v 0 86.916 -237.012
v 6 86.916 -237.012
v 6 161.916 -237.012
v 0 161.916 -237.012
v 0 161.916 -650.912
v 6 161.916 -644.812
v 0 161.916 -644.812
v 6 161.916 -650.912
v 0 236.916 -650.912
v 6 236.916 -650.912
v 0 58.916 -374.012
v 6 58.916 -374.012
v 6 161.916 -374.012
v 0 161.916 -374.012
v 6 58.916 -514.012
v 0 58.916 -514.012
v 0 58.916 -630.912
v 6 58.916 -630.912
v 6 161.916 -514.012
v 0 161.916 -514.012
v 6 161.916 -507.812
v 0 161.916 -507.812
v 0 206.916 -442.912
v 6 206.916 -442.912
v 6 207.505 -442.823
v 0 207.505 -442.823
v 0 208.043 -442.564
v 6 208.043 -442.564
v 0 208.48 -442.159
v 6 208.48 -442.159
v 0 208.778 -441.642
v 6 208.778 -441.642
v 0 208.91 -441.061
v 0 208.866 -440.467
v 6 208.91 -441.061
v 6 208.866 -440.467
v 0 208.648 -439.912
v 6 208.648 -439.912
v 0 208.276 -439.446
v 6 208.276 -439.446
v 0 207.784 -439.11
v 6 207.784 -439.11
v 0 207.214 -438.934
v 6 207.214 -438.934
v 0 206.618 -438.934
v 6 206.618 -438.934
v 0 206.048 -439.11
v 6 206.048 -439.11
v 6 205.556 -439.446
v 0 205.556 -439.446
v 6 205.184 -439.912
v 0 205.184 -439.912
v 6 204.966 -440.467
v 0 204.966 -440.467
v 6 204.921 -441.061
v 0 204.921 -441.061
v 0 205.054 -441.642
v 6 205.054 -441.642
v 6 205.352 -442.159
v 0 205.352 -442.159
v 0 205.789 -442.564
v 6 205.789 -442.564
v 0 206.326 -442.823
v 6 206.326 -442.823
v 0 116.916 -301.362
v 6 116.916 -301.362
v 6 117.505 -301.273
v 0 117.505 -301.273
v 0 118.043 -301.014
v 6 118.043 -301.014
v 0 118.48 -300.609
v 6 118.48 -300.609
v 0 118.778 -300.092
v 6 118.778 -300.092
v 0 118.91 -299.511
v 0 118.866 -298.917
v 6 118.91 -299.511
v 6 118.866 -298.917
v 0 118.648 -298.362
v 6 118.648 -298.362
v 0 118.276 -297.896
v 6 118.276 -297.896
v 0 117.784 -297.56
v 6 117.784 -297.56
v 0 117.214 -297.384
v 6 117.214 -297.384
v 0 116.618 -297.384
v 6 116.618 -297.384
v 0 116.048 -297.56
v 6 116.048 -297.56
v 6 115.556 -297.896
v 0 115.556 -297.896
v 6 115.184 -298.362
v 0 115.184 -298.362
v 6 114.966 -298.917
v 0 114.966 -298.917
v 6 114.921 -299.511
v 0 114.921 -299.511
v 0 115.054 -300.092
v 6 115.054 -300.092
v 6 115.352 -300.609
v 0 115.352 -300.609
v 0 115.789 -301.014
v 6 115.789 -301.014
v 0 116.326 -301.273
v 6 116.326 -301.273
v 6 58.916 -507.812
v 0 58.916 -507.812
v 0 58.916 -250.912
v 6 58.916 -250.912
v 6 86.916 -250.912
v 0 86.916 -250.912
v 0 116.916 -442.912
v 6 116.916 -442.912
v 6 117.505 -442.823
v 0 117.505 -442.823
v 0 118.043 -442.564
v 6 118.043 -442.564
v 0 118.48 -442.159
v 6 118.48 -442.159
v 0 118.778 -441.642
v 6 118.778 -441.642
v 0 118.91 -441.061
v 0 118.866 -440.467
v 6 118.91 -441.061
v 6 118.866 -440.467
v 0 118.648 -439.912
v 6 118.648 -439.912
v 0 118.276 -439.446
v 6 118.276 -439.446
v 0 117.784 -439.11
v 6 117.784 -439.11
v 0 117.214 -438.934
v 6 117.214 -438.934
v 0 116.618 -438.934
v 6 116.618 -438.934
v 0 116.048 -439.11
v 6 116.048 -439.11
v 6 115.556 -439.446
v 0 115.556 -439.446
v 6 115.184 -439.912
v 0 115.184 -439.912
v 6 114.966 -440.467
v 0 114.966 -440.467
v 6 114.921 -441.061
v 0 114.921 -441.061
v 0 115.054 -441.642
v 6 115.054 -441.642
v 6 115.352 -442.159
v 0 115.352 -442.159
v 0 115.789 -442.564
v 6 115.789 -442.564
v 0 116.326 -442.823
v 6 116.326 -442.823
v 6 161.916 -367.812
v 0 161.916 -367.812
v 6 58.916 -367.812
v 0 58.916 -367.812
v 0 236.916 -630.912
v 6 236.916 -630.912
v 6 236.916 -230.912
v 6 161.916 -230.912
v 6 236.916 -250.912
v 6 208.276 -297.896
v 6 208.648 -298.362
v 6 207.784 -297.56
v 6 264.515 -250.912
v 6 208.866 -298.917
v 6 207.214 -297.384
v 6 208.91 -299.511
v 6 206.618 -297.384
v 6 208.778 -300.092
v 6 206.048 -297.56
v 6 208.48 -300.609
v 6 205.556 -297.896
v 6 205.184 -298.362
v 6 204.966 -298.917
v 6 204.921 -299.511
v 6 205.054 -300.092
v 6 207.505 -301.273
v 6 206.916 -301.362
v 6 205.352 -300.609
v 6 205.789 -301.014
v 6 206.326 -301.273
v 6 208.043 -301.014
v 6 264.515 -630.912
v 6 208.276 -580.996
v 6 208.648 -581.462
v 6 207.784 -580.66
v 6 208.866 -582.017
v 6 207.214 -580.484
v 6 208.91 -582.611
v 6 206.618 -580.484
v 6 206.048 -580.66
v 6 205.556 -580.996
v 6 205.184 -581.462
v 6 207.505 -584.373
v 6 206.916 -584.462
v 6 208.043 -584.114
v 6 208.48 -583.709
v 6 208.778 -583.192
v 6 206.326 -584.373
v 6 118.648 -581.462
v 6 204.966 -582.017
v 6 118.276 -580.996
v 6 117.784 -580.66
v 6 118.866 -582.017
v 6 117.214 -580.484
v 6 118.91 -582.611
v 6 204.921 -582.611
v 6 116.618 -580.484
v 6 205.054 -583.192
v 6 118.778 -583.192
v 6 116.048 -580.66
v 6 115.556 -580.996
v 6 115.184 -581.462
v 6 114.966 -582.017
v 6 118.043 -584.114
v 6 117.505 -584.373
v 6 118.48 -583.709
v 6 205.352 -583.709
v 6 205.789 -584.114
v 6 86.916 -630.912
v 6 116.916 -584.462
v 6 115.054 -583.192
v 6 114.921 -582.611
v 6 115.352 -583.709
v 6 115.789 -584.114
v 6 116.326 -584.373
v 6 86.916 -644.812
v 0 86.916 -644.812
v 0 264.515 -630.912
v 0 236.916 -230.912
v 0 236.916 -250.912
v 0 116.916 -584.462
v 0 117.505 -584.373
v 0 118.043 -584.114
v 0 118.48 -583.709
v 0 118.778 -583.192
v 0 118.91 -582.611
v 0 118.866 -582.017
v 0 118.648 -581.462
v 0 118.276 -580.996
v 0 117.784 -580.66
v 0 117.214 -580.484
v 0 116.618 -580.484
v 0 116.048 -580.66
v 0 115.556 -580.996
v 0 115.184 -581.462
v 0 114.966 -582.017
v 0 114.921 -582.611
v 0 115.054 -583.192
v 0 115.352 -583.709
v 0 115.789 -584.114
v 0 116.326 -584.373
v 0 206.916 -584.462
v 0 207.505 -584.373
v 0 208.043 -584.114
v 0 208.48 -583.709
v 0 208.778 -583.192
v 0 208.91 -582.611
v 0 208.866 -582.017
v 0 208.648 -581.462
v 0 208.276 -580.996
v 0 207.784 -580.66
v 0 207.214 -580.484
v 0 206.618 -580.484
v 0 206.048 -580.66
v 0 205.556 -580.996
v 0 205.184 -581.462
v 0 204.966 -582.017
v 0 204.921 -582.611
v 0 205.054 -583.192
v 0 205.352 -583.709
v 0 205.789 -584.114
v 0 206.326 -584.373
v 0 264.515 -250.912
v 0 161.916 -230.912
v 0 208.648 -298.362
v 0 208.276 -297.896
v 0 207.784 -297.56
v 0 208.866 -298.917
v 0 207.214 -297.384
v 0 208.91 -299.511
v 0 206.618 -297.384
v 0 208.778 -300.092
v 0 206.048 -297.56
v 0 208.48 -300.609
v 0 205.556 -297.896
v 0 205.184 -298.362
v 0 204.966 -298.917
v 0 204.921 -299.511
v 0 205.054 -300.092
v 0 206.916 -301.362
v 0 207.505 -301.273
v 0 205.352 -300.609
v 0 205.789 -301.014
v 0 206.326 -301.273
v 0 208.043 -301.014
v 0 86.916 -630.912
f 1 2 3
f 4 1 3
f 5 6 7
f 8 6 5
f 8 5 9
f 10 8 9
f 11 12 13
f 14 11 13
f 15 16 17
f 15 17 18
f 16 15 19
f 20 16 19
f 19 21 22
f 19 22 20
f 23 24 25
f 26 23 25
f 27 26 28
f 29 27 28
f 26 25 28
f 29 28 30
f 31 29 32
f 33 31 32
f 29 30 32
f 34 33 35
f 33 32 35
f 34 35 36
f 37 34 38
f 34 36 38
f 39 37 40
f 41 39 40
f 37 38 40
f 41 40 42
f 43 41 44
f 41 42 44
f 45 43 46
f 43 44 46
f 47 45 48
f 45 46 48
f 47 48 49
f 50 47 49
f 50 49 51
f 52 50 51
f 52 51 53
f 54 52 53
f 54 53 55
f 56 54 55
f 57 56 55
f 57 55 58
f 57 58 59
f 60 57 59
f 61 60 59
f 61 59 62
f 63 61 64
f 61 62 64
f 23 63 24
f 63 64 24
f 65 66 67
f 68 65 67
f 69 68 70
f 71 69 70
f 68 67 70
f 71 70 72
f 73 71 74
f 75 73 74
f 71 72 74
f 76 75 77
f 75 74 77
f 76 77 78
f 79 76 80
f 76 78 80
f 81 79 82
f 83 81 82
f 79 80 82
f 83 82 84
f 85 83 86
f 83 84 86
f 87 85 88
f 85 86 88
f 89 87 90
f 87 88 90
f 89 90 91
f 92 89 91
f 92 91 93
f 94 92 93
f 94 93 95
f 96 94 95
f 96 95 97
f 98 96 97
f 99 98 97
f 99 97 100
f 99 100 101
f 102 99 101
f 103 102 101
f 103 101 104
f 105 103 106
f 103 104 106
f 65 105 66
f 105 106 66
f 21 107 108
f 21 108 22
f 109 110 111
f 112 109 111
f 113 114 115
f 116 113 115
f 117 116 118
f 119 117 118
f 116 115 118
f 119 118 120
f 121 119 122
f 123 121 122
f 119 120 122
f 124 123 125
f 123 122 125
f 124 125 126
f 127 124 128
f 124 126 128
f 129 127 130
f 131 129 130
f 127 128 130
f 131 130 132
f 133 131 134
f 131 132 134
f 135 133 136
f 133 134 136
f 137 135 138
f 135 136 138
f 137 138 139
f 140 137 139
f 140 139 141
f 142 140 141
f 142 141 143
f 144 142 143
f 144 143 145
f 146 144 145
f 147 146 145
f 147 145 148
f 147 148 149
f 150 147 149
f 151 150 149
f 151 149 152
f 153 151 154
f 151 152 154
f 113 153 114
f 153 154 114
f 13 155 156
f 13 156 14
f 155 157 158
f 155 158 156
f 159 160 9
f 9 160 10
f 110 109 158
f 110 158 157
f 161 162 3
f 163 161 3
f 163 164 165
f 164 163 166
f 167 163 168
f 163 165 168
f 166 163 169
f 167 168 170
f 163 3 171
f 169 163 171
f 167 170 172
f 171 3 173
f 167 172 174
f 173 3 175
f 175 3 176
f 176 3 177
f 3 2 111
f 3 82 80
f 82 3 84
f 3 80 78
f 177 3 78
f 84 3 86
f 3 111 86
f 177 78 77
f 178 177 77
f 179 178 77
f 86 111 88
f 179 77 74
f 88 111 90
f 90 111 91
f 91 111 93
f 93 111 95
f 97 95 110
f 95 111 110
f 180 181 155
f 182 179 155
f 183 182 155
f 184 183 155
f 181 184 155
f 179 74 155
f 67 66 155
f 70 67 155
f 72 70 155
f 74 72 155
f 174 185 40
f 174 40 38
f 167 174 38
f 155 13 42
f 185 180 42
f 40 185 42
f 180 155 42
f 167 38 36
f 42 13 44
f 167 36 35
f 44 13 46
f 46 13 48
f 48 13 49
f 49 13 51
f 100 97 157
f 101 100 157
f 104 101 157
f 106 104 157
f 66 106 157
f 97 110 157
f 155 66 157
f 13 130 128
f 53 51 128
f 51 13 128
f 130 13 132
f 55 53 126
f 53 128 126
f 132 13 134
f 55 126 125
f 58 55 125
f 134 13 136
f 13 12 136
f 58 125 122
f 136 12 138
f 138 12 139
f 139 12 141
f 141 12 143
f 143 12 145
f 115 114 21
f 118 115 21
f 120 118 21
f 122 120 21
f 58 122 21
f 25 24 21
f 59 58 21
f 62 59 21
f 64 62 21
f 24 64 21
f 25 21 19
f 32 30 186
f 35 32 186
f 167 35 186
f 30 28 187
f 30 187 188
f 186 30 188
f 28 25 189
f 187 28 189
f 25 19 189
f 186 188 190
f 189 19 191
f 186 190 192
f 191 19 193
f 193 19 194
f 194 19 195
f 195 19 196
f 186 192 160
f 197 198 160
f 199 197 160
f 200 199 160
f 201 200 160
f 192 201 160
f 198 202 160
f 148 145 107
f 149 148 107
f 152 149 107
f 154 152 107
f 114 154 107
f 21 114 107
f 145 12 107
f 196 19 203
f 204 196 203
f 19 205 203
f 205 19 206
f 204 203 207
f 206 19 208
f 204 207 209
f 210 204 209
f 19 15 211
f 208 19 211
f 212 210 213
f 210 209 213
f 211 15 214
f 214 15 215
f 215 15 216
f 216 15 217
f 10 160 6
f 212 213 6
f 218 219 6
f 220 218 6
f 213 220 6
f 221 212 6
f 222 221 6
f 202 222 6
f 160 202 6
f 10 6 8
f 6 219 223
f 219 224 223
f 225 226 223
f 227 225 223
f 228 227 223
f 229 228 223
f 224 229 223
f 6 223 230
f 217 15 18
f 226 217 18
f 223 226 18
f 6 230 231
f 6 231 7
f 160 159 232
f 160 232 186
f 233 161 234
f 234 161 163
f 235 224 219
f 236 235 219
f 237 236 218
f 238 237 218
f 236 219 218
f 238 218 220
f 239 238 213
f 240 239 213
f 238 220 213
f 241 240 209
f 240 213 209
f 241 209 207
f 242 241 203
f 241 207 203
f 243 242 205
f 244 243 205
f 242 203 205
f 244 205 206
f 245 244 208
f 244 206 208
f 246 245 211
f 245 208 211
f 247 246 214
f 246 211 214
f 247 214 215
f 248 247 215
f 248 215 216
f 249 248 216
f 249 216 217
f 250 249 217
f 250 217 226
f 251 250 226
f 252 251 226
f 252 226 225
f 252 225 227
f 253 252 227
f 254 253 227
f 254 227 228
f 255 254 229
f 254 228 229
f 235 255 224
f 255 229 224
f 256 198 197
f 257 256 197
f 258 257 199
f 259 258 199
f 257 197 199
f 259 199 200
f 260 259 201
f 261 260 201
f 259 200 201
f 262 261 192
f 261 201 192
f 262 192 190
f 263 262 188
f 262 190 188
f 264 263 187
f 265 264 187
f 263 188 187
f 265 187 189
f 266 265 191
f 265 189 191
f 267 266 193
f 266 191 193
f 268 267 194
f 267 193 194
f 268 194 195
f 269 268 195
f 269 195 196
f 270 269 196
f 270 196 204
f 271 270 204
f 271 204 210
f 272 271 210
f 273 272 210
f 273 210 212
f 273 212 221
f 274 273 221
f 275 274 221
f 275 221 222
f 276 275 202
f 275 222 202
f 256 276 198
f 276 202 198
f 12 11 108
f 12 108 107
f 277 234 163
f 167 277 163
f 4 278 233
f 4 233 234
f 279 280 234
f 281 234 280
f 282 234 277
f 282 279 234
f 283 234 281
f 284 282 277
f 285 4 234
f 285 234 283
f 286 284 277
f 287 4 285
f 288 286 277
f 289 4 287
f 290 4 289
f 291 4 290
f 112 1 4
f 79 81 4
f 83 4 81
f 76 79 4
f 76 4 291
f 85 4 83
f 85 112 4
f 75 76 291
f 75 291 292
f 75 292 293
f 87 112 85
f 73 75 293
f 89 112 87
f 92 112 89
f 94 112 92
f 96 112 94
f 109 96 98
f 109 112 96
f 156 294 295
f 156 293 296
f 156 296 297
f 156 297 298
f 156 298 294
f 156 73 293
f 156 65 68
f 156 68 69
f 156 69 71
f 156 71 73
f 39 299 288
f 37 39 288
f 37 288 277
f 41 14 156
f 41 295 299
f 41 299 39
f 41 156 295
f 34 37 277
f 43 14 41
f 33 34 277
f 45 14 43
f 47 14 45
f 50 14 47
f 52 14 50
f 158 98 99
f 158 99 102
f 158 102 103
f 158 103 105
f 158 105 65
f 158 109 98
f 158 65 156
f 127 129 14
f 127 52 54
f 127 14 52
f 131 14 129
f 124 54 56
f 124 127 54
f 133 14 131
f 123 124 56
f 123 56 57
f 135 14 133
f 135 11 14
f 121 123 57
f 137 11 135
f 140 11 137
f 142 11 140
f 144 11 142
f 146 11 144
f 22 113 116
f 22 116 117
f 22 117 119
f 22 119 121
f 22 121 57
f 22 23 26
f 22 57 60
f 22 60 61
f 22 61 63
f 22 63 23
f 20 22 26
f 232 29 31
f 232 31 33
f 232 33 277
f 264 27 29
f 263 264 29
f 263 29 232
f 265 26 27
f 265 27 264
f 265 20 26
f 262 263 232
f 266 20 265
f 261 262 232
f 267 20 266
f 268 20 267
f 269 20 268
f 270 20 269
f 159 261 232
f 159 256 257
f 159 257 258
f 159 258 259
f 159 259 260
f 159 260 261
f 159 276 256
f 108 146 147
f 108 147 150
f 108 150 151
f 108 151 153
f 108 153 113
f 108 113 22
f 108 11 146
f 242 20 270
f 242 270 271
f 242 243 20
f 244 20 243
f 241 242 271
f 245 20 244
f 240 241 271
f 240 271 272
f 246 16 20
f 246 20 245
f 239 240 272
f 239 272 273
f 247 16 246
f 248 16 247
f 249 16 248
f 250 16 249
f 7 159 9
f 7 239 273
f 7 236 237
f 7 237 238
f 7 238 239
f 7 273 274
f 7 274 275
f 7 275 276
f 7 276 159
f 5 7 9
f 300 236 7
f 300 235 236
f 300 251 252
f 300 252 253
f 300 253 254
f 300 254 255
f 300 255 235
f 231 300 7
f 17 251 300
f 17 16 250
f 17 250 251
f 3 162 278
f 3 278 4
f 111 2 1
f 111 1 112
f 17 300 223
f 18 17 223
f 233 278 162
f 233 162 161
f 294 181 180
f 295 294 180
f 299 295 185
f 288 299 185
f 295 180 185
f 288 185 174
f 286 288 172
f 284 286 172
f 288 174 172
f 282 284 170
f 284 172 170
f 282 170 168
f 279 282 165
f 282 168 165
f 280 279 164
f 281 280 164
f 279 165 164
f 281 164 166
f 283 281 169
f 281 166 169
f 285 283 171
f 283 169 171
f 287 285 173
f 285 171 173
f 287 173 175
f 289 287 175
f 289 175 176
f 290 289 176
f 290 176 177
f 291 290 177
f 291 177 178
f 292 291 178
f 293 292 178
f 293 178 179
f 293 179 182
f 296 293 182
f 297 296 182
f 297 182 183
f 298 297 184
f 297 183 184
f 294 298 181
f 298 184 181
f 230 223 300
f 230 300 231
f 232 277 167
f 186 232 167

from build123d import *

# Parameters (mm, degrees)
SKETCH3_W           = 420
SKETCH3_H           = 170
BOSS_EXTRUDE2_DEPTH = 6
SKETCH4_W           = 6.1
SKETCH4_H           = 85
SKETCH4_W_2         = 6.2
CUT_EXTRUDE1_DEPTH  = 6
SKETCH5_R           = 2
CUT_EXTRUDE2_DEPTH  = 6
SKETCH6_W           = 6
SKETCH6_H           = 380
BOSS_EXTRUDE3_DEPTH = 30
SKETCH7_W           = 6
SKETCH7_H           = 380
CUT_EXTRUDE3_DEPTH  = 2
SKETCH8_W           = 6
SKETCH8_H           = 116.9
SKETCH8_H_2         = 133.8
BOSS_EXTRUDE4_DEPTH = 28
SKETCH9_W           = 6
SKETCH9_H           = 6.2
BOSS_EXTRUDE5_DEPTH = 113
SKETCH10_W          = 6
SKETCH10_H          = 6.2
BOSS_EXTRUDE6_DEPTH = 113
SKETCH11_W          = 6.2
SKETCH11_H          = 113
CUT_EXTRUDE4_DEPTH  = 113
SKETCH12_W          = 6
SKETCH12_H          = 10
CUT_EXTRUDE6_DEPTH  = 1000
SKETCH13_W          = 20
SKETCH13_H          = 10
SKETCH13_W_2        = 13.9
CUT_EXTRUDE7_DEPTH  = 1000


with BuildPart() as part:
    # Sketch3 → Boss-Extrude2 (new body)
    with BuildSketch(Plane(origin=(0, 0, 0), x_dir=(0, 0, -1), z_dir=(1, 0, 0))):
        with Locations((440.911700258, 161.915861829)):
            Rectangle(SKETCH3_W, SKETCH3_H)
    extrude(amount=BOSS_EXTRUDE2_DEPTH)

    # Sketch4 → Cut-Extrude1 (cut)
    with BuildSketch(Plane(origin=(6, 0, 0), x_dir=(0, 0, -1), z_dir=(1, 0, 0))):
        with Locations((233.961700258, 119.415861829)):
            Rectangle(SKETCH4_W, SKETCH4_H)
        with Locations((647.861700258, 119.415861829)):
            Rectangle(SKETCH4_W, SKETCH4_H)
        with Locations((370.911700258, 204.415861829)):
            Rectangle(SKETCH4_W_2, SKETCH4_H)
        with Locations((510.911700258, 204.415861829)):
            Rectangle(SKETCH4_W_2, SKETCH4_H)
    extrude(amount=-CUT_EXTRUDE1_DEPTH, mode=Mode.SUBTRACT)

    # Sketch5 → Cut-Extrude2 (cut)
    with BuildSketch(Plane(origin=(6, 0, 0), x_dir=(0, 0, -1), z_dir=(1, 0, 0))):
        with Locations((299.361700258, 206.915861829)):
            Circle(SKETCH5_R)
        with Locations((299.361700258, 116.915861829)):
            Circle(SKETCH5_R)
        with Locations((440.911700258, 206.915861829)):
            Circle(SKETCH5_R)
        with Locations((582.461700258, 206.915861829)):
            Circle(SKETCH5_R)
        with Locations((582.461700258, 116.915861829)):
            Circle(SKETCH5_R)
        with Locations((440.911700258, 116.915861829)):
            Circle(SKETCH5_R)
    extrude(amount=-CUT_EXTRUDE2_DEPTH, mode=Mode.SUBTRACT)

    # Sketch6 → Boss-Extrude3 (add)
    with BuildSketch(Plane.XZ.offset(-76.915861829)):
        with Locations((3, -440.911700258)):
            Rectangle(SKETCH6_W, SKETCH6_H)
    extrude(amount=BOSS_EXTRUDE3_DEPTH)

    # Sketch7 → Cut-Extrude3 (cut)
    with BuildSketch(Plane.XZ.offset(-46.915861829)):
        with Locations((3, -440.911700258)):
            Rectangle(SKETCH7_W, SKETCH7_H)
    extrude(amount=-CUT_EXTRUDE3_DEPTH, mode=Mode.SUBTRACT)

    # Sketch8 → Boss-Extrude4 (add)
    with BuildSketch(Plane(origin=(0, 246.915861829, 0), x_dir=(1, 0, 0), z_dir=(0, 1, 0))):
        with Locations((3, 309.361700258)):
            Rectangle(SKETCH8_W, SKETCH8_H)
        with Locations((3, 572.461700258)):
            Rectangle(SKETCH8_W, SKETCH8_H)
        with Locations((3, 440.911700258)):
            Rectangle(SKETCH8_W, SKETCH8_H_2)
    extrude(amount=BOSS_EXTRUDE4_DEPTH)

    # Sketch9 → Boss-Extrude5 (add)
    with BuildSketch(Plane(origin=(0, 161.915861829, 0), x_dir=(1, 0, 0), z_dir=(0, 1, 0))):
        with Locations((3, 370.911700258)):
            Rectangle(SKETCH9_W, SKETCH9_H)
    extrude(amount=BOSS_EXTRUDE5_DEPTH)

    # Sketch10 → Boss-Extrude6 (add)
    with BuildSketch(Plane(origin=(0, 161.915861829, 0), x_dir=(1, 0, 0), z_dir=(0, 1, 0))):
        with Locations((3, 510.911700258)):
            Rectangle(SKETCH10_W, SKETCH10_H)
    extrude(amount=BOSS_EXTRUDE6_DEPTH)

    # Sketch11 → Cut-Extrude4 (cut)
    with BuildSketch(Plane(origin=(6, 0, 0), x_dir=(0, 0, -1), z_dir=(1, 0, 0))):
        with Locations((370.911700258, 105.415861829)):
            Rectangle(SKETCH11_W, SKETCH11_H)
        with Locations((510.911700258, 105.415861829)):
            Rectangle(SKETCH11_W, SKETCH11_H)
    extrude(amount=-CUT_EXTRUDE4_DEPTH, mode=Mode.SUBTRACT)

    # Sketch12 → Cut-Extrude6 (cut)
    with BuildSketch(Plane.XY.offset(-250.911700258)):
        with Locations((3, 269.515338883)):
            Rectangle(SKETCH12_W, SKETCH12_H)
        with Locations((3, 53.915861829)):
            Rectangle(SKETCH12_W, SKETCH12_H)
    extrude(amount=-CUT_EXTRUDE6_DEPTH, mode=Mode.SUBTRACT)


with BuildPart() as body_2:
    # of the pieces the cut leaves, the one that is kept (cut_extrude6_keep)
    add(part.part.solids().sort_by_distance((0, 76.915861829, -237.011700258))[0])

    # Sketch13 → Cut-Extrude7 (cut)
    with BuildSketch(Plane(origin=(6, 0, 0), x_dir=(0, 0, -1), z_dir=(1, 0, 0))):
        with Locations((240.911700258, 241.915861829)):
            Rectangle(SKETCH13_W, SKETCH13_H)
        with Locations((640.911700258, 241.915861829)):
            Rectangle(SKETCH13_W, SKETCH13_H)
        with Locations((243.961700258, 81.915861829)):
            Rectangle(SKETCH13_W_2, SKETCH13_H)
        with Locations((637.861700258, 81.915861829)):
            Rectangle(SKETCH13_W_2, SKETCH13_H)
    extrude(amount=-CUT_EXTRUDE7_DEPTH, mode=Mode.SUBTRACT)


solid = body_2.part
